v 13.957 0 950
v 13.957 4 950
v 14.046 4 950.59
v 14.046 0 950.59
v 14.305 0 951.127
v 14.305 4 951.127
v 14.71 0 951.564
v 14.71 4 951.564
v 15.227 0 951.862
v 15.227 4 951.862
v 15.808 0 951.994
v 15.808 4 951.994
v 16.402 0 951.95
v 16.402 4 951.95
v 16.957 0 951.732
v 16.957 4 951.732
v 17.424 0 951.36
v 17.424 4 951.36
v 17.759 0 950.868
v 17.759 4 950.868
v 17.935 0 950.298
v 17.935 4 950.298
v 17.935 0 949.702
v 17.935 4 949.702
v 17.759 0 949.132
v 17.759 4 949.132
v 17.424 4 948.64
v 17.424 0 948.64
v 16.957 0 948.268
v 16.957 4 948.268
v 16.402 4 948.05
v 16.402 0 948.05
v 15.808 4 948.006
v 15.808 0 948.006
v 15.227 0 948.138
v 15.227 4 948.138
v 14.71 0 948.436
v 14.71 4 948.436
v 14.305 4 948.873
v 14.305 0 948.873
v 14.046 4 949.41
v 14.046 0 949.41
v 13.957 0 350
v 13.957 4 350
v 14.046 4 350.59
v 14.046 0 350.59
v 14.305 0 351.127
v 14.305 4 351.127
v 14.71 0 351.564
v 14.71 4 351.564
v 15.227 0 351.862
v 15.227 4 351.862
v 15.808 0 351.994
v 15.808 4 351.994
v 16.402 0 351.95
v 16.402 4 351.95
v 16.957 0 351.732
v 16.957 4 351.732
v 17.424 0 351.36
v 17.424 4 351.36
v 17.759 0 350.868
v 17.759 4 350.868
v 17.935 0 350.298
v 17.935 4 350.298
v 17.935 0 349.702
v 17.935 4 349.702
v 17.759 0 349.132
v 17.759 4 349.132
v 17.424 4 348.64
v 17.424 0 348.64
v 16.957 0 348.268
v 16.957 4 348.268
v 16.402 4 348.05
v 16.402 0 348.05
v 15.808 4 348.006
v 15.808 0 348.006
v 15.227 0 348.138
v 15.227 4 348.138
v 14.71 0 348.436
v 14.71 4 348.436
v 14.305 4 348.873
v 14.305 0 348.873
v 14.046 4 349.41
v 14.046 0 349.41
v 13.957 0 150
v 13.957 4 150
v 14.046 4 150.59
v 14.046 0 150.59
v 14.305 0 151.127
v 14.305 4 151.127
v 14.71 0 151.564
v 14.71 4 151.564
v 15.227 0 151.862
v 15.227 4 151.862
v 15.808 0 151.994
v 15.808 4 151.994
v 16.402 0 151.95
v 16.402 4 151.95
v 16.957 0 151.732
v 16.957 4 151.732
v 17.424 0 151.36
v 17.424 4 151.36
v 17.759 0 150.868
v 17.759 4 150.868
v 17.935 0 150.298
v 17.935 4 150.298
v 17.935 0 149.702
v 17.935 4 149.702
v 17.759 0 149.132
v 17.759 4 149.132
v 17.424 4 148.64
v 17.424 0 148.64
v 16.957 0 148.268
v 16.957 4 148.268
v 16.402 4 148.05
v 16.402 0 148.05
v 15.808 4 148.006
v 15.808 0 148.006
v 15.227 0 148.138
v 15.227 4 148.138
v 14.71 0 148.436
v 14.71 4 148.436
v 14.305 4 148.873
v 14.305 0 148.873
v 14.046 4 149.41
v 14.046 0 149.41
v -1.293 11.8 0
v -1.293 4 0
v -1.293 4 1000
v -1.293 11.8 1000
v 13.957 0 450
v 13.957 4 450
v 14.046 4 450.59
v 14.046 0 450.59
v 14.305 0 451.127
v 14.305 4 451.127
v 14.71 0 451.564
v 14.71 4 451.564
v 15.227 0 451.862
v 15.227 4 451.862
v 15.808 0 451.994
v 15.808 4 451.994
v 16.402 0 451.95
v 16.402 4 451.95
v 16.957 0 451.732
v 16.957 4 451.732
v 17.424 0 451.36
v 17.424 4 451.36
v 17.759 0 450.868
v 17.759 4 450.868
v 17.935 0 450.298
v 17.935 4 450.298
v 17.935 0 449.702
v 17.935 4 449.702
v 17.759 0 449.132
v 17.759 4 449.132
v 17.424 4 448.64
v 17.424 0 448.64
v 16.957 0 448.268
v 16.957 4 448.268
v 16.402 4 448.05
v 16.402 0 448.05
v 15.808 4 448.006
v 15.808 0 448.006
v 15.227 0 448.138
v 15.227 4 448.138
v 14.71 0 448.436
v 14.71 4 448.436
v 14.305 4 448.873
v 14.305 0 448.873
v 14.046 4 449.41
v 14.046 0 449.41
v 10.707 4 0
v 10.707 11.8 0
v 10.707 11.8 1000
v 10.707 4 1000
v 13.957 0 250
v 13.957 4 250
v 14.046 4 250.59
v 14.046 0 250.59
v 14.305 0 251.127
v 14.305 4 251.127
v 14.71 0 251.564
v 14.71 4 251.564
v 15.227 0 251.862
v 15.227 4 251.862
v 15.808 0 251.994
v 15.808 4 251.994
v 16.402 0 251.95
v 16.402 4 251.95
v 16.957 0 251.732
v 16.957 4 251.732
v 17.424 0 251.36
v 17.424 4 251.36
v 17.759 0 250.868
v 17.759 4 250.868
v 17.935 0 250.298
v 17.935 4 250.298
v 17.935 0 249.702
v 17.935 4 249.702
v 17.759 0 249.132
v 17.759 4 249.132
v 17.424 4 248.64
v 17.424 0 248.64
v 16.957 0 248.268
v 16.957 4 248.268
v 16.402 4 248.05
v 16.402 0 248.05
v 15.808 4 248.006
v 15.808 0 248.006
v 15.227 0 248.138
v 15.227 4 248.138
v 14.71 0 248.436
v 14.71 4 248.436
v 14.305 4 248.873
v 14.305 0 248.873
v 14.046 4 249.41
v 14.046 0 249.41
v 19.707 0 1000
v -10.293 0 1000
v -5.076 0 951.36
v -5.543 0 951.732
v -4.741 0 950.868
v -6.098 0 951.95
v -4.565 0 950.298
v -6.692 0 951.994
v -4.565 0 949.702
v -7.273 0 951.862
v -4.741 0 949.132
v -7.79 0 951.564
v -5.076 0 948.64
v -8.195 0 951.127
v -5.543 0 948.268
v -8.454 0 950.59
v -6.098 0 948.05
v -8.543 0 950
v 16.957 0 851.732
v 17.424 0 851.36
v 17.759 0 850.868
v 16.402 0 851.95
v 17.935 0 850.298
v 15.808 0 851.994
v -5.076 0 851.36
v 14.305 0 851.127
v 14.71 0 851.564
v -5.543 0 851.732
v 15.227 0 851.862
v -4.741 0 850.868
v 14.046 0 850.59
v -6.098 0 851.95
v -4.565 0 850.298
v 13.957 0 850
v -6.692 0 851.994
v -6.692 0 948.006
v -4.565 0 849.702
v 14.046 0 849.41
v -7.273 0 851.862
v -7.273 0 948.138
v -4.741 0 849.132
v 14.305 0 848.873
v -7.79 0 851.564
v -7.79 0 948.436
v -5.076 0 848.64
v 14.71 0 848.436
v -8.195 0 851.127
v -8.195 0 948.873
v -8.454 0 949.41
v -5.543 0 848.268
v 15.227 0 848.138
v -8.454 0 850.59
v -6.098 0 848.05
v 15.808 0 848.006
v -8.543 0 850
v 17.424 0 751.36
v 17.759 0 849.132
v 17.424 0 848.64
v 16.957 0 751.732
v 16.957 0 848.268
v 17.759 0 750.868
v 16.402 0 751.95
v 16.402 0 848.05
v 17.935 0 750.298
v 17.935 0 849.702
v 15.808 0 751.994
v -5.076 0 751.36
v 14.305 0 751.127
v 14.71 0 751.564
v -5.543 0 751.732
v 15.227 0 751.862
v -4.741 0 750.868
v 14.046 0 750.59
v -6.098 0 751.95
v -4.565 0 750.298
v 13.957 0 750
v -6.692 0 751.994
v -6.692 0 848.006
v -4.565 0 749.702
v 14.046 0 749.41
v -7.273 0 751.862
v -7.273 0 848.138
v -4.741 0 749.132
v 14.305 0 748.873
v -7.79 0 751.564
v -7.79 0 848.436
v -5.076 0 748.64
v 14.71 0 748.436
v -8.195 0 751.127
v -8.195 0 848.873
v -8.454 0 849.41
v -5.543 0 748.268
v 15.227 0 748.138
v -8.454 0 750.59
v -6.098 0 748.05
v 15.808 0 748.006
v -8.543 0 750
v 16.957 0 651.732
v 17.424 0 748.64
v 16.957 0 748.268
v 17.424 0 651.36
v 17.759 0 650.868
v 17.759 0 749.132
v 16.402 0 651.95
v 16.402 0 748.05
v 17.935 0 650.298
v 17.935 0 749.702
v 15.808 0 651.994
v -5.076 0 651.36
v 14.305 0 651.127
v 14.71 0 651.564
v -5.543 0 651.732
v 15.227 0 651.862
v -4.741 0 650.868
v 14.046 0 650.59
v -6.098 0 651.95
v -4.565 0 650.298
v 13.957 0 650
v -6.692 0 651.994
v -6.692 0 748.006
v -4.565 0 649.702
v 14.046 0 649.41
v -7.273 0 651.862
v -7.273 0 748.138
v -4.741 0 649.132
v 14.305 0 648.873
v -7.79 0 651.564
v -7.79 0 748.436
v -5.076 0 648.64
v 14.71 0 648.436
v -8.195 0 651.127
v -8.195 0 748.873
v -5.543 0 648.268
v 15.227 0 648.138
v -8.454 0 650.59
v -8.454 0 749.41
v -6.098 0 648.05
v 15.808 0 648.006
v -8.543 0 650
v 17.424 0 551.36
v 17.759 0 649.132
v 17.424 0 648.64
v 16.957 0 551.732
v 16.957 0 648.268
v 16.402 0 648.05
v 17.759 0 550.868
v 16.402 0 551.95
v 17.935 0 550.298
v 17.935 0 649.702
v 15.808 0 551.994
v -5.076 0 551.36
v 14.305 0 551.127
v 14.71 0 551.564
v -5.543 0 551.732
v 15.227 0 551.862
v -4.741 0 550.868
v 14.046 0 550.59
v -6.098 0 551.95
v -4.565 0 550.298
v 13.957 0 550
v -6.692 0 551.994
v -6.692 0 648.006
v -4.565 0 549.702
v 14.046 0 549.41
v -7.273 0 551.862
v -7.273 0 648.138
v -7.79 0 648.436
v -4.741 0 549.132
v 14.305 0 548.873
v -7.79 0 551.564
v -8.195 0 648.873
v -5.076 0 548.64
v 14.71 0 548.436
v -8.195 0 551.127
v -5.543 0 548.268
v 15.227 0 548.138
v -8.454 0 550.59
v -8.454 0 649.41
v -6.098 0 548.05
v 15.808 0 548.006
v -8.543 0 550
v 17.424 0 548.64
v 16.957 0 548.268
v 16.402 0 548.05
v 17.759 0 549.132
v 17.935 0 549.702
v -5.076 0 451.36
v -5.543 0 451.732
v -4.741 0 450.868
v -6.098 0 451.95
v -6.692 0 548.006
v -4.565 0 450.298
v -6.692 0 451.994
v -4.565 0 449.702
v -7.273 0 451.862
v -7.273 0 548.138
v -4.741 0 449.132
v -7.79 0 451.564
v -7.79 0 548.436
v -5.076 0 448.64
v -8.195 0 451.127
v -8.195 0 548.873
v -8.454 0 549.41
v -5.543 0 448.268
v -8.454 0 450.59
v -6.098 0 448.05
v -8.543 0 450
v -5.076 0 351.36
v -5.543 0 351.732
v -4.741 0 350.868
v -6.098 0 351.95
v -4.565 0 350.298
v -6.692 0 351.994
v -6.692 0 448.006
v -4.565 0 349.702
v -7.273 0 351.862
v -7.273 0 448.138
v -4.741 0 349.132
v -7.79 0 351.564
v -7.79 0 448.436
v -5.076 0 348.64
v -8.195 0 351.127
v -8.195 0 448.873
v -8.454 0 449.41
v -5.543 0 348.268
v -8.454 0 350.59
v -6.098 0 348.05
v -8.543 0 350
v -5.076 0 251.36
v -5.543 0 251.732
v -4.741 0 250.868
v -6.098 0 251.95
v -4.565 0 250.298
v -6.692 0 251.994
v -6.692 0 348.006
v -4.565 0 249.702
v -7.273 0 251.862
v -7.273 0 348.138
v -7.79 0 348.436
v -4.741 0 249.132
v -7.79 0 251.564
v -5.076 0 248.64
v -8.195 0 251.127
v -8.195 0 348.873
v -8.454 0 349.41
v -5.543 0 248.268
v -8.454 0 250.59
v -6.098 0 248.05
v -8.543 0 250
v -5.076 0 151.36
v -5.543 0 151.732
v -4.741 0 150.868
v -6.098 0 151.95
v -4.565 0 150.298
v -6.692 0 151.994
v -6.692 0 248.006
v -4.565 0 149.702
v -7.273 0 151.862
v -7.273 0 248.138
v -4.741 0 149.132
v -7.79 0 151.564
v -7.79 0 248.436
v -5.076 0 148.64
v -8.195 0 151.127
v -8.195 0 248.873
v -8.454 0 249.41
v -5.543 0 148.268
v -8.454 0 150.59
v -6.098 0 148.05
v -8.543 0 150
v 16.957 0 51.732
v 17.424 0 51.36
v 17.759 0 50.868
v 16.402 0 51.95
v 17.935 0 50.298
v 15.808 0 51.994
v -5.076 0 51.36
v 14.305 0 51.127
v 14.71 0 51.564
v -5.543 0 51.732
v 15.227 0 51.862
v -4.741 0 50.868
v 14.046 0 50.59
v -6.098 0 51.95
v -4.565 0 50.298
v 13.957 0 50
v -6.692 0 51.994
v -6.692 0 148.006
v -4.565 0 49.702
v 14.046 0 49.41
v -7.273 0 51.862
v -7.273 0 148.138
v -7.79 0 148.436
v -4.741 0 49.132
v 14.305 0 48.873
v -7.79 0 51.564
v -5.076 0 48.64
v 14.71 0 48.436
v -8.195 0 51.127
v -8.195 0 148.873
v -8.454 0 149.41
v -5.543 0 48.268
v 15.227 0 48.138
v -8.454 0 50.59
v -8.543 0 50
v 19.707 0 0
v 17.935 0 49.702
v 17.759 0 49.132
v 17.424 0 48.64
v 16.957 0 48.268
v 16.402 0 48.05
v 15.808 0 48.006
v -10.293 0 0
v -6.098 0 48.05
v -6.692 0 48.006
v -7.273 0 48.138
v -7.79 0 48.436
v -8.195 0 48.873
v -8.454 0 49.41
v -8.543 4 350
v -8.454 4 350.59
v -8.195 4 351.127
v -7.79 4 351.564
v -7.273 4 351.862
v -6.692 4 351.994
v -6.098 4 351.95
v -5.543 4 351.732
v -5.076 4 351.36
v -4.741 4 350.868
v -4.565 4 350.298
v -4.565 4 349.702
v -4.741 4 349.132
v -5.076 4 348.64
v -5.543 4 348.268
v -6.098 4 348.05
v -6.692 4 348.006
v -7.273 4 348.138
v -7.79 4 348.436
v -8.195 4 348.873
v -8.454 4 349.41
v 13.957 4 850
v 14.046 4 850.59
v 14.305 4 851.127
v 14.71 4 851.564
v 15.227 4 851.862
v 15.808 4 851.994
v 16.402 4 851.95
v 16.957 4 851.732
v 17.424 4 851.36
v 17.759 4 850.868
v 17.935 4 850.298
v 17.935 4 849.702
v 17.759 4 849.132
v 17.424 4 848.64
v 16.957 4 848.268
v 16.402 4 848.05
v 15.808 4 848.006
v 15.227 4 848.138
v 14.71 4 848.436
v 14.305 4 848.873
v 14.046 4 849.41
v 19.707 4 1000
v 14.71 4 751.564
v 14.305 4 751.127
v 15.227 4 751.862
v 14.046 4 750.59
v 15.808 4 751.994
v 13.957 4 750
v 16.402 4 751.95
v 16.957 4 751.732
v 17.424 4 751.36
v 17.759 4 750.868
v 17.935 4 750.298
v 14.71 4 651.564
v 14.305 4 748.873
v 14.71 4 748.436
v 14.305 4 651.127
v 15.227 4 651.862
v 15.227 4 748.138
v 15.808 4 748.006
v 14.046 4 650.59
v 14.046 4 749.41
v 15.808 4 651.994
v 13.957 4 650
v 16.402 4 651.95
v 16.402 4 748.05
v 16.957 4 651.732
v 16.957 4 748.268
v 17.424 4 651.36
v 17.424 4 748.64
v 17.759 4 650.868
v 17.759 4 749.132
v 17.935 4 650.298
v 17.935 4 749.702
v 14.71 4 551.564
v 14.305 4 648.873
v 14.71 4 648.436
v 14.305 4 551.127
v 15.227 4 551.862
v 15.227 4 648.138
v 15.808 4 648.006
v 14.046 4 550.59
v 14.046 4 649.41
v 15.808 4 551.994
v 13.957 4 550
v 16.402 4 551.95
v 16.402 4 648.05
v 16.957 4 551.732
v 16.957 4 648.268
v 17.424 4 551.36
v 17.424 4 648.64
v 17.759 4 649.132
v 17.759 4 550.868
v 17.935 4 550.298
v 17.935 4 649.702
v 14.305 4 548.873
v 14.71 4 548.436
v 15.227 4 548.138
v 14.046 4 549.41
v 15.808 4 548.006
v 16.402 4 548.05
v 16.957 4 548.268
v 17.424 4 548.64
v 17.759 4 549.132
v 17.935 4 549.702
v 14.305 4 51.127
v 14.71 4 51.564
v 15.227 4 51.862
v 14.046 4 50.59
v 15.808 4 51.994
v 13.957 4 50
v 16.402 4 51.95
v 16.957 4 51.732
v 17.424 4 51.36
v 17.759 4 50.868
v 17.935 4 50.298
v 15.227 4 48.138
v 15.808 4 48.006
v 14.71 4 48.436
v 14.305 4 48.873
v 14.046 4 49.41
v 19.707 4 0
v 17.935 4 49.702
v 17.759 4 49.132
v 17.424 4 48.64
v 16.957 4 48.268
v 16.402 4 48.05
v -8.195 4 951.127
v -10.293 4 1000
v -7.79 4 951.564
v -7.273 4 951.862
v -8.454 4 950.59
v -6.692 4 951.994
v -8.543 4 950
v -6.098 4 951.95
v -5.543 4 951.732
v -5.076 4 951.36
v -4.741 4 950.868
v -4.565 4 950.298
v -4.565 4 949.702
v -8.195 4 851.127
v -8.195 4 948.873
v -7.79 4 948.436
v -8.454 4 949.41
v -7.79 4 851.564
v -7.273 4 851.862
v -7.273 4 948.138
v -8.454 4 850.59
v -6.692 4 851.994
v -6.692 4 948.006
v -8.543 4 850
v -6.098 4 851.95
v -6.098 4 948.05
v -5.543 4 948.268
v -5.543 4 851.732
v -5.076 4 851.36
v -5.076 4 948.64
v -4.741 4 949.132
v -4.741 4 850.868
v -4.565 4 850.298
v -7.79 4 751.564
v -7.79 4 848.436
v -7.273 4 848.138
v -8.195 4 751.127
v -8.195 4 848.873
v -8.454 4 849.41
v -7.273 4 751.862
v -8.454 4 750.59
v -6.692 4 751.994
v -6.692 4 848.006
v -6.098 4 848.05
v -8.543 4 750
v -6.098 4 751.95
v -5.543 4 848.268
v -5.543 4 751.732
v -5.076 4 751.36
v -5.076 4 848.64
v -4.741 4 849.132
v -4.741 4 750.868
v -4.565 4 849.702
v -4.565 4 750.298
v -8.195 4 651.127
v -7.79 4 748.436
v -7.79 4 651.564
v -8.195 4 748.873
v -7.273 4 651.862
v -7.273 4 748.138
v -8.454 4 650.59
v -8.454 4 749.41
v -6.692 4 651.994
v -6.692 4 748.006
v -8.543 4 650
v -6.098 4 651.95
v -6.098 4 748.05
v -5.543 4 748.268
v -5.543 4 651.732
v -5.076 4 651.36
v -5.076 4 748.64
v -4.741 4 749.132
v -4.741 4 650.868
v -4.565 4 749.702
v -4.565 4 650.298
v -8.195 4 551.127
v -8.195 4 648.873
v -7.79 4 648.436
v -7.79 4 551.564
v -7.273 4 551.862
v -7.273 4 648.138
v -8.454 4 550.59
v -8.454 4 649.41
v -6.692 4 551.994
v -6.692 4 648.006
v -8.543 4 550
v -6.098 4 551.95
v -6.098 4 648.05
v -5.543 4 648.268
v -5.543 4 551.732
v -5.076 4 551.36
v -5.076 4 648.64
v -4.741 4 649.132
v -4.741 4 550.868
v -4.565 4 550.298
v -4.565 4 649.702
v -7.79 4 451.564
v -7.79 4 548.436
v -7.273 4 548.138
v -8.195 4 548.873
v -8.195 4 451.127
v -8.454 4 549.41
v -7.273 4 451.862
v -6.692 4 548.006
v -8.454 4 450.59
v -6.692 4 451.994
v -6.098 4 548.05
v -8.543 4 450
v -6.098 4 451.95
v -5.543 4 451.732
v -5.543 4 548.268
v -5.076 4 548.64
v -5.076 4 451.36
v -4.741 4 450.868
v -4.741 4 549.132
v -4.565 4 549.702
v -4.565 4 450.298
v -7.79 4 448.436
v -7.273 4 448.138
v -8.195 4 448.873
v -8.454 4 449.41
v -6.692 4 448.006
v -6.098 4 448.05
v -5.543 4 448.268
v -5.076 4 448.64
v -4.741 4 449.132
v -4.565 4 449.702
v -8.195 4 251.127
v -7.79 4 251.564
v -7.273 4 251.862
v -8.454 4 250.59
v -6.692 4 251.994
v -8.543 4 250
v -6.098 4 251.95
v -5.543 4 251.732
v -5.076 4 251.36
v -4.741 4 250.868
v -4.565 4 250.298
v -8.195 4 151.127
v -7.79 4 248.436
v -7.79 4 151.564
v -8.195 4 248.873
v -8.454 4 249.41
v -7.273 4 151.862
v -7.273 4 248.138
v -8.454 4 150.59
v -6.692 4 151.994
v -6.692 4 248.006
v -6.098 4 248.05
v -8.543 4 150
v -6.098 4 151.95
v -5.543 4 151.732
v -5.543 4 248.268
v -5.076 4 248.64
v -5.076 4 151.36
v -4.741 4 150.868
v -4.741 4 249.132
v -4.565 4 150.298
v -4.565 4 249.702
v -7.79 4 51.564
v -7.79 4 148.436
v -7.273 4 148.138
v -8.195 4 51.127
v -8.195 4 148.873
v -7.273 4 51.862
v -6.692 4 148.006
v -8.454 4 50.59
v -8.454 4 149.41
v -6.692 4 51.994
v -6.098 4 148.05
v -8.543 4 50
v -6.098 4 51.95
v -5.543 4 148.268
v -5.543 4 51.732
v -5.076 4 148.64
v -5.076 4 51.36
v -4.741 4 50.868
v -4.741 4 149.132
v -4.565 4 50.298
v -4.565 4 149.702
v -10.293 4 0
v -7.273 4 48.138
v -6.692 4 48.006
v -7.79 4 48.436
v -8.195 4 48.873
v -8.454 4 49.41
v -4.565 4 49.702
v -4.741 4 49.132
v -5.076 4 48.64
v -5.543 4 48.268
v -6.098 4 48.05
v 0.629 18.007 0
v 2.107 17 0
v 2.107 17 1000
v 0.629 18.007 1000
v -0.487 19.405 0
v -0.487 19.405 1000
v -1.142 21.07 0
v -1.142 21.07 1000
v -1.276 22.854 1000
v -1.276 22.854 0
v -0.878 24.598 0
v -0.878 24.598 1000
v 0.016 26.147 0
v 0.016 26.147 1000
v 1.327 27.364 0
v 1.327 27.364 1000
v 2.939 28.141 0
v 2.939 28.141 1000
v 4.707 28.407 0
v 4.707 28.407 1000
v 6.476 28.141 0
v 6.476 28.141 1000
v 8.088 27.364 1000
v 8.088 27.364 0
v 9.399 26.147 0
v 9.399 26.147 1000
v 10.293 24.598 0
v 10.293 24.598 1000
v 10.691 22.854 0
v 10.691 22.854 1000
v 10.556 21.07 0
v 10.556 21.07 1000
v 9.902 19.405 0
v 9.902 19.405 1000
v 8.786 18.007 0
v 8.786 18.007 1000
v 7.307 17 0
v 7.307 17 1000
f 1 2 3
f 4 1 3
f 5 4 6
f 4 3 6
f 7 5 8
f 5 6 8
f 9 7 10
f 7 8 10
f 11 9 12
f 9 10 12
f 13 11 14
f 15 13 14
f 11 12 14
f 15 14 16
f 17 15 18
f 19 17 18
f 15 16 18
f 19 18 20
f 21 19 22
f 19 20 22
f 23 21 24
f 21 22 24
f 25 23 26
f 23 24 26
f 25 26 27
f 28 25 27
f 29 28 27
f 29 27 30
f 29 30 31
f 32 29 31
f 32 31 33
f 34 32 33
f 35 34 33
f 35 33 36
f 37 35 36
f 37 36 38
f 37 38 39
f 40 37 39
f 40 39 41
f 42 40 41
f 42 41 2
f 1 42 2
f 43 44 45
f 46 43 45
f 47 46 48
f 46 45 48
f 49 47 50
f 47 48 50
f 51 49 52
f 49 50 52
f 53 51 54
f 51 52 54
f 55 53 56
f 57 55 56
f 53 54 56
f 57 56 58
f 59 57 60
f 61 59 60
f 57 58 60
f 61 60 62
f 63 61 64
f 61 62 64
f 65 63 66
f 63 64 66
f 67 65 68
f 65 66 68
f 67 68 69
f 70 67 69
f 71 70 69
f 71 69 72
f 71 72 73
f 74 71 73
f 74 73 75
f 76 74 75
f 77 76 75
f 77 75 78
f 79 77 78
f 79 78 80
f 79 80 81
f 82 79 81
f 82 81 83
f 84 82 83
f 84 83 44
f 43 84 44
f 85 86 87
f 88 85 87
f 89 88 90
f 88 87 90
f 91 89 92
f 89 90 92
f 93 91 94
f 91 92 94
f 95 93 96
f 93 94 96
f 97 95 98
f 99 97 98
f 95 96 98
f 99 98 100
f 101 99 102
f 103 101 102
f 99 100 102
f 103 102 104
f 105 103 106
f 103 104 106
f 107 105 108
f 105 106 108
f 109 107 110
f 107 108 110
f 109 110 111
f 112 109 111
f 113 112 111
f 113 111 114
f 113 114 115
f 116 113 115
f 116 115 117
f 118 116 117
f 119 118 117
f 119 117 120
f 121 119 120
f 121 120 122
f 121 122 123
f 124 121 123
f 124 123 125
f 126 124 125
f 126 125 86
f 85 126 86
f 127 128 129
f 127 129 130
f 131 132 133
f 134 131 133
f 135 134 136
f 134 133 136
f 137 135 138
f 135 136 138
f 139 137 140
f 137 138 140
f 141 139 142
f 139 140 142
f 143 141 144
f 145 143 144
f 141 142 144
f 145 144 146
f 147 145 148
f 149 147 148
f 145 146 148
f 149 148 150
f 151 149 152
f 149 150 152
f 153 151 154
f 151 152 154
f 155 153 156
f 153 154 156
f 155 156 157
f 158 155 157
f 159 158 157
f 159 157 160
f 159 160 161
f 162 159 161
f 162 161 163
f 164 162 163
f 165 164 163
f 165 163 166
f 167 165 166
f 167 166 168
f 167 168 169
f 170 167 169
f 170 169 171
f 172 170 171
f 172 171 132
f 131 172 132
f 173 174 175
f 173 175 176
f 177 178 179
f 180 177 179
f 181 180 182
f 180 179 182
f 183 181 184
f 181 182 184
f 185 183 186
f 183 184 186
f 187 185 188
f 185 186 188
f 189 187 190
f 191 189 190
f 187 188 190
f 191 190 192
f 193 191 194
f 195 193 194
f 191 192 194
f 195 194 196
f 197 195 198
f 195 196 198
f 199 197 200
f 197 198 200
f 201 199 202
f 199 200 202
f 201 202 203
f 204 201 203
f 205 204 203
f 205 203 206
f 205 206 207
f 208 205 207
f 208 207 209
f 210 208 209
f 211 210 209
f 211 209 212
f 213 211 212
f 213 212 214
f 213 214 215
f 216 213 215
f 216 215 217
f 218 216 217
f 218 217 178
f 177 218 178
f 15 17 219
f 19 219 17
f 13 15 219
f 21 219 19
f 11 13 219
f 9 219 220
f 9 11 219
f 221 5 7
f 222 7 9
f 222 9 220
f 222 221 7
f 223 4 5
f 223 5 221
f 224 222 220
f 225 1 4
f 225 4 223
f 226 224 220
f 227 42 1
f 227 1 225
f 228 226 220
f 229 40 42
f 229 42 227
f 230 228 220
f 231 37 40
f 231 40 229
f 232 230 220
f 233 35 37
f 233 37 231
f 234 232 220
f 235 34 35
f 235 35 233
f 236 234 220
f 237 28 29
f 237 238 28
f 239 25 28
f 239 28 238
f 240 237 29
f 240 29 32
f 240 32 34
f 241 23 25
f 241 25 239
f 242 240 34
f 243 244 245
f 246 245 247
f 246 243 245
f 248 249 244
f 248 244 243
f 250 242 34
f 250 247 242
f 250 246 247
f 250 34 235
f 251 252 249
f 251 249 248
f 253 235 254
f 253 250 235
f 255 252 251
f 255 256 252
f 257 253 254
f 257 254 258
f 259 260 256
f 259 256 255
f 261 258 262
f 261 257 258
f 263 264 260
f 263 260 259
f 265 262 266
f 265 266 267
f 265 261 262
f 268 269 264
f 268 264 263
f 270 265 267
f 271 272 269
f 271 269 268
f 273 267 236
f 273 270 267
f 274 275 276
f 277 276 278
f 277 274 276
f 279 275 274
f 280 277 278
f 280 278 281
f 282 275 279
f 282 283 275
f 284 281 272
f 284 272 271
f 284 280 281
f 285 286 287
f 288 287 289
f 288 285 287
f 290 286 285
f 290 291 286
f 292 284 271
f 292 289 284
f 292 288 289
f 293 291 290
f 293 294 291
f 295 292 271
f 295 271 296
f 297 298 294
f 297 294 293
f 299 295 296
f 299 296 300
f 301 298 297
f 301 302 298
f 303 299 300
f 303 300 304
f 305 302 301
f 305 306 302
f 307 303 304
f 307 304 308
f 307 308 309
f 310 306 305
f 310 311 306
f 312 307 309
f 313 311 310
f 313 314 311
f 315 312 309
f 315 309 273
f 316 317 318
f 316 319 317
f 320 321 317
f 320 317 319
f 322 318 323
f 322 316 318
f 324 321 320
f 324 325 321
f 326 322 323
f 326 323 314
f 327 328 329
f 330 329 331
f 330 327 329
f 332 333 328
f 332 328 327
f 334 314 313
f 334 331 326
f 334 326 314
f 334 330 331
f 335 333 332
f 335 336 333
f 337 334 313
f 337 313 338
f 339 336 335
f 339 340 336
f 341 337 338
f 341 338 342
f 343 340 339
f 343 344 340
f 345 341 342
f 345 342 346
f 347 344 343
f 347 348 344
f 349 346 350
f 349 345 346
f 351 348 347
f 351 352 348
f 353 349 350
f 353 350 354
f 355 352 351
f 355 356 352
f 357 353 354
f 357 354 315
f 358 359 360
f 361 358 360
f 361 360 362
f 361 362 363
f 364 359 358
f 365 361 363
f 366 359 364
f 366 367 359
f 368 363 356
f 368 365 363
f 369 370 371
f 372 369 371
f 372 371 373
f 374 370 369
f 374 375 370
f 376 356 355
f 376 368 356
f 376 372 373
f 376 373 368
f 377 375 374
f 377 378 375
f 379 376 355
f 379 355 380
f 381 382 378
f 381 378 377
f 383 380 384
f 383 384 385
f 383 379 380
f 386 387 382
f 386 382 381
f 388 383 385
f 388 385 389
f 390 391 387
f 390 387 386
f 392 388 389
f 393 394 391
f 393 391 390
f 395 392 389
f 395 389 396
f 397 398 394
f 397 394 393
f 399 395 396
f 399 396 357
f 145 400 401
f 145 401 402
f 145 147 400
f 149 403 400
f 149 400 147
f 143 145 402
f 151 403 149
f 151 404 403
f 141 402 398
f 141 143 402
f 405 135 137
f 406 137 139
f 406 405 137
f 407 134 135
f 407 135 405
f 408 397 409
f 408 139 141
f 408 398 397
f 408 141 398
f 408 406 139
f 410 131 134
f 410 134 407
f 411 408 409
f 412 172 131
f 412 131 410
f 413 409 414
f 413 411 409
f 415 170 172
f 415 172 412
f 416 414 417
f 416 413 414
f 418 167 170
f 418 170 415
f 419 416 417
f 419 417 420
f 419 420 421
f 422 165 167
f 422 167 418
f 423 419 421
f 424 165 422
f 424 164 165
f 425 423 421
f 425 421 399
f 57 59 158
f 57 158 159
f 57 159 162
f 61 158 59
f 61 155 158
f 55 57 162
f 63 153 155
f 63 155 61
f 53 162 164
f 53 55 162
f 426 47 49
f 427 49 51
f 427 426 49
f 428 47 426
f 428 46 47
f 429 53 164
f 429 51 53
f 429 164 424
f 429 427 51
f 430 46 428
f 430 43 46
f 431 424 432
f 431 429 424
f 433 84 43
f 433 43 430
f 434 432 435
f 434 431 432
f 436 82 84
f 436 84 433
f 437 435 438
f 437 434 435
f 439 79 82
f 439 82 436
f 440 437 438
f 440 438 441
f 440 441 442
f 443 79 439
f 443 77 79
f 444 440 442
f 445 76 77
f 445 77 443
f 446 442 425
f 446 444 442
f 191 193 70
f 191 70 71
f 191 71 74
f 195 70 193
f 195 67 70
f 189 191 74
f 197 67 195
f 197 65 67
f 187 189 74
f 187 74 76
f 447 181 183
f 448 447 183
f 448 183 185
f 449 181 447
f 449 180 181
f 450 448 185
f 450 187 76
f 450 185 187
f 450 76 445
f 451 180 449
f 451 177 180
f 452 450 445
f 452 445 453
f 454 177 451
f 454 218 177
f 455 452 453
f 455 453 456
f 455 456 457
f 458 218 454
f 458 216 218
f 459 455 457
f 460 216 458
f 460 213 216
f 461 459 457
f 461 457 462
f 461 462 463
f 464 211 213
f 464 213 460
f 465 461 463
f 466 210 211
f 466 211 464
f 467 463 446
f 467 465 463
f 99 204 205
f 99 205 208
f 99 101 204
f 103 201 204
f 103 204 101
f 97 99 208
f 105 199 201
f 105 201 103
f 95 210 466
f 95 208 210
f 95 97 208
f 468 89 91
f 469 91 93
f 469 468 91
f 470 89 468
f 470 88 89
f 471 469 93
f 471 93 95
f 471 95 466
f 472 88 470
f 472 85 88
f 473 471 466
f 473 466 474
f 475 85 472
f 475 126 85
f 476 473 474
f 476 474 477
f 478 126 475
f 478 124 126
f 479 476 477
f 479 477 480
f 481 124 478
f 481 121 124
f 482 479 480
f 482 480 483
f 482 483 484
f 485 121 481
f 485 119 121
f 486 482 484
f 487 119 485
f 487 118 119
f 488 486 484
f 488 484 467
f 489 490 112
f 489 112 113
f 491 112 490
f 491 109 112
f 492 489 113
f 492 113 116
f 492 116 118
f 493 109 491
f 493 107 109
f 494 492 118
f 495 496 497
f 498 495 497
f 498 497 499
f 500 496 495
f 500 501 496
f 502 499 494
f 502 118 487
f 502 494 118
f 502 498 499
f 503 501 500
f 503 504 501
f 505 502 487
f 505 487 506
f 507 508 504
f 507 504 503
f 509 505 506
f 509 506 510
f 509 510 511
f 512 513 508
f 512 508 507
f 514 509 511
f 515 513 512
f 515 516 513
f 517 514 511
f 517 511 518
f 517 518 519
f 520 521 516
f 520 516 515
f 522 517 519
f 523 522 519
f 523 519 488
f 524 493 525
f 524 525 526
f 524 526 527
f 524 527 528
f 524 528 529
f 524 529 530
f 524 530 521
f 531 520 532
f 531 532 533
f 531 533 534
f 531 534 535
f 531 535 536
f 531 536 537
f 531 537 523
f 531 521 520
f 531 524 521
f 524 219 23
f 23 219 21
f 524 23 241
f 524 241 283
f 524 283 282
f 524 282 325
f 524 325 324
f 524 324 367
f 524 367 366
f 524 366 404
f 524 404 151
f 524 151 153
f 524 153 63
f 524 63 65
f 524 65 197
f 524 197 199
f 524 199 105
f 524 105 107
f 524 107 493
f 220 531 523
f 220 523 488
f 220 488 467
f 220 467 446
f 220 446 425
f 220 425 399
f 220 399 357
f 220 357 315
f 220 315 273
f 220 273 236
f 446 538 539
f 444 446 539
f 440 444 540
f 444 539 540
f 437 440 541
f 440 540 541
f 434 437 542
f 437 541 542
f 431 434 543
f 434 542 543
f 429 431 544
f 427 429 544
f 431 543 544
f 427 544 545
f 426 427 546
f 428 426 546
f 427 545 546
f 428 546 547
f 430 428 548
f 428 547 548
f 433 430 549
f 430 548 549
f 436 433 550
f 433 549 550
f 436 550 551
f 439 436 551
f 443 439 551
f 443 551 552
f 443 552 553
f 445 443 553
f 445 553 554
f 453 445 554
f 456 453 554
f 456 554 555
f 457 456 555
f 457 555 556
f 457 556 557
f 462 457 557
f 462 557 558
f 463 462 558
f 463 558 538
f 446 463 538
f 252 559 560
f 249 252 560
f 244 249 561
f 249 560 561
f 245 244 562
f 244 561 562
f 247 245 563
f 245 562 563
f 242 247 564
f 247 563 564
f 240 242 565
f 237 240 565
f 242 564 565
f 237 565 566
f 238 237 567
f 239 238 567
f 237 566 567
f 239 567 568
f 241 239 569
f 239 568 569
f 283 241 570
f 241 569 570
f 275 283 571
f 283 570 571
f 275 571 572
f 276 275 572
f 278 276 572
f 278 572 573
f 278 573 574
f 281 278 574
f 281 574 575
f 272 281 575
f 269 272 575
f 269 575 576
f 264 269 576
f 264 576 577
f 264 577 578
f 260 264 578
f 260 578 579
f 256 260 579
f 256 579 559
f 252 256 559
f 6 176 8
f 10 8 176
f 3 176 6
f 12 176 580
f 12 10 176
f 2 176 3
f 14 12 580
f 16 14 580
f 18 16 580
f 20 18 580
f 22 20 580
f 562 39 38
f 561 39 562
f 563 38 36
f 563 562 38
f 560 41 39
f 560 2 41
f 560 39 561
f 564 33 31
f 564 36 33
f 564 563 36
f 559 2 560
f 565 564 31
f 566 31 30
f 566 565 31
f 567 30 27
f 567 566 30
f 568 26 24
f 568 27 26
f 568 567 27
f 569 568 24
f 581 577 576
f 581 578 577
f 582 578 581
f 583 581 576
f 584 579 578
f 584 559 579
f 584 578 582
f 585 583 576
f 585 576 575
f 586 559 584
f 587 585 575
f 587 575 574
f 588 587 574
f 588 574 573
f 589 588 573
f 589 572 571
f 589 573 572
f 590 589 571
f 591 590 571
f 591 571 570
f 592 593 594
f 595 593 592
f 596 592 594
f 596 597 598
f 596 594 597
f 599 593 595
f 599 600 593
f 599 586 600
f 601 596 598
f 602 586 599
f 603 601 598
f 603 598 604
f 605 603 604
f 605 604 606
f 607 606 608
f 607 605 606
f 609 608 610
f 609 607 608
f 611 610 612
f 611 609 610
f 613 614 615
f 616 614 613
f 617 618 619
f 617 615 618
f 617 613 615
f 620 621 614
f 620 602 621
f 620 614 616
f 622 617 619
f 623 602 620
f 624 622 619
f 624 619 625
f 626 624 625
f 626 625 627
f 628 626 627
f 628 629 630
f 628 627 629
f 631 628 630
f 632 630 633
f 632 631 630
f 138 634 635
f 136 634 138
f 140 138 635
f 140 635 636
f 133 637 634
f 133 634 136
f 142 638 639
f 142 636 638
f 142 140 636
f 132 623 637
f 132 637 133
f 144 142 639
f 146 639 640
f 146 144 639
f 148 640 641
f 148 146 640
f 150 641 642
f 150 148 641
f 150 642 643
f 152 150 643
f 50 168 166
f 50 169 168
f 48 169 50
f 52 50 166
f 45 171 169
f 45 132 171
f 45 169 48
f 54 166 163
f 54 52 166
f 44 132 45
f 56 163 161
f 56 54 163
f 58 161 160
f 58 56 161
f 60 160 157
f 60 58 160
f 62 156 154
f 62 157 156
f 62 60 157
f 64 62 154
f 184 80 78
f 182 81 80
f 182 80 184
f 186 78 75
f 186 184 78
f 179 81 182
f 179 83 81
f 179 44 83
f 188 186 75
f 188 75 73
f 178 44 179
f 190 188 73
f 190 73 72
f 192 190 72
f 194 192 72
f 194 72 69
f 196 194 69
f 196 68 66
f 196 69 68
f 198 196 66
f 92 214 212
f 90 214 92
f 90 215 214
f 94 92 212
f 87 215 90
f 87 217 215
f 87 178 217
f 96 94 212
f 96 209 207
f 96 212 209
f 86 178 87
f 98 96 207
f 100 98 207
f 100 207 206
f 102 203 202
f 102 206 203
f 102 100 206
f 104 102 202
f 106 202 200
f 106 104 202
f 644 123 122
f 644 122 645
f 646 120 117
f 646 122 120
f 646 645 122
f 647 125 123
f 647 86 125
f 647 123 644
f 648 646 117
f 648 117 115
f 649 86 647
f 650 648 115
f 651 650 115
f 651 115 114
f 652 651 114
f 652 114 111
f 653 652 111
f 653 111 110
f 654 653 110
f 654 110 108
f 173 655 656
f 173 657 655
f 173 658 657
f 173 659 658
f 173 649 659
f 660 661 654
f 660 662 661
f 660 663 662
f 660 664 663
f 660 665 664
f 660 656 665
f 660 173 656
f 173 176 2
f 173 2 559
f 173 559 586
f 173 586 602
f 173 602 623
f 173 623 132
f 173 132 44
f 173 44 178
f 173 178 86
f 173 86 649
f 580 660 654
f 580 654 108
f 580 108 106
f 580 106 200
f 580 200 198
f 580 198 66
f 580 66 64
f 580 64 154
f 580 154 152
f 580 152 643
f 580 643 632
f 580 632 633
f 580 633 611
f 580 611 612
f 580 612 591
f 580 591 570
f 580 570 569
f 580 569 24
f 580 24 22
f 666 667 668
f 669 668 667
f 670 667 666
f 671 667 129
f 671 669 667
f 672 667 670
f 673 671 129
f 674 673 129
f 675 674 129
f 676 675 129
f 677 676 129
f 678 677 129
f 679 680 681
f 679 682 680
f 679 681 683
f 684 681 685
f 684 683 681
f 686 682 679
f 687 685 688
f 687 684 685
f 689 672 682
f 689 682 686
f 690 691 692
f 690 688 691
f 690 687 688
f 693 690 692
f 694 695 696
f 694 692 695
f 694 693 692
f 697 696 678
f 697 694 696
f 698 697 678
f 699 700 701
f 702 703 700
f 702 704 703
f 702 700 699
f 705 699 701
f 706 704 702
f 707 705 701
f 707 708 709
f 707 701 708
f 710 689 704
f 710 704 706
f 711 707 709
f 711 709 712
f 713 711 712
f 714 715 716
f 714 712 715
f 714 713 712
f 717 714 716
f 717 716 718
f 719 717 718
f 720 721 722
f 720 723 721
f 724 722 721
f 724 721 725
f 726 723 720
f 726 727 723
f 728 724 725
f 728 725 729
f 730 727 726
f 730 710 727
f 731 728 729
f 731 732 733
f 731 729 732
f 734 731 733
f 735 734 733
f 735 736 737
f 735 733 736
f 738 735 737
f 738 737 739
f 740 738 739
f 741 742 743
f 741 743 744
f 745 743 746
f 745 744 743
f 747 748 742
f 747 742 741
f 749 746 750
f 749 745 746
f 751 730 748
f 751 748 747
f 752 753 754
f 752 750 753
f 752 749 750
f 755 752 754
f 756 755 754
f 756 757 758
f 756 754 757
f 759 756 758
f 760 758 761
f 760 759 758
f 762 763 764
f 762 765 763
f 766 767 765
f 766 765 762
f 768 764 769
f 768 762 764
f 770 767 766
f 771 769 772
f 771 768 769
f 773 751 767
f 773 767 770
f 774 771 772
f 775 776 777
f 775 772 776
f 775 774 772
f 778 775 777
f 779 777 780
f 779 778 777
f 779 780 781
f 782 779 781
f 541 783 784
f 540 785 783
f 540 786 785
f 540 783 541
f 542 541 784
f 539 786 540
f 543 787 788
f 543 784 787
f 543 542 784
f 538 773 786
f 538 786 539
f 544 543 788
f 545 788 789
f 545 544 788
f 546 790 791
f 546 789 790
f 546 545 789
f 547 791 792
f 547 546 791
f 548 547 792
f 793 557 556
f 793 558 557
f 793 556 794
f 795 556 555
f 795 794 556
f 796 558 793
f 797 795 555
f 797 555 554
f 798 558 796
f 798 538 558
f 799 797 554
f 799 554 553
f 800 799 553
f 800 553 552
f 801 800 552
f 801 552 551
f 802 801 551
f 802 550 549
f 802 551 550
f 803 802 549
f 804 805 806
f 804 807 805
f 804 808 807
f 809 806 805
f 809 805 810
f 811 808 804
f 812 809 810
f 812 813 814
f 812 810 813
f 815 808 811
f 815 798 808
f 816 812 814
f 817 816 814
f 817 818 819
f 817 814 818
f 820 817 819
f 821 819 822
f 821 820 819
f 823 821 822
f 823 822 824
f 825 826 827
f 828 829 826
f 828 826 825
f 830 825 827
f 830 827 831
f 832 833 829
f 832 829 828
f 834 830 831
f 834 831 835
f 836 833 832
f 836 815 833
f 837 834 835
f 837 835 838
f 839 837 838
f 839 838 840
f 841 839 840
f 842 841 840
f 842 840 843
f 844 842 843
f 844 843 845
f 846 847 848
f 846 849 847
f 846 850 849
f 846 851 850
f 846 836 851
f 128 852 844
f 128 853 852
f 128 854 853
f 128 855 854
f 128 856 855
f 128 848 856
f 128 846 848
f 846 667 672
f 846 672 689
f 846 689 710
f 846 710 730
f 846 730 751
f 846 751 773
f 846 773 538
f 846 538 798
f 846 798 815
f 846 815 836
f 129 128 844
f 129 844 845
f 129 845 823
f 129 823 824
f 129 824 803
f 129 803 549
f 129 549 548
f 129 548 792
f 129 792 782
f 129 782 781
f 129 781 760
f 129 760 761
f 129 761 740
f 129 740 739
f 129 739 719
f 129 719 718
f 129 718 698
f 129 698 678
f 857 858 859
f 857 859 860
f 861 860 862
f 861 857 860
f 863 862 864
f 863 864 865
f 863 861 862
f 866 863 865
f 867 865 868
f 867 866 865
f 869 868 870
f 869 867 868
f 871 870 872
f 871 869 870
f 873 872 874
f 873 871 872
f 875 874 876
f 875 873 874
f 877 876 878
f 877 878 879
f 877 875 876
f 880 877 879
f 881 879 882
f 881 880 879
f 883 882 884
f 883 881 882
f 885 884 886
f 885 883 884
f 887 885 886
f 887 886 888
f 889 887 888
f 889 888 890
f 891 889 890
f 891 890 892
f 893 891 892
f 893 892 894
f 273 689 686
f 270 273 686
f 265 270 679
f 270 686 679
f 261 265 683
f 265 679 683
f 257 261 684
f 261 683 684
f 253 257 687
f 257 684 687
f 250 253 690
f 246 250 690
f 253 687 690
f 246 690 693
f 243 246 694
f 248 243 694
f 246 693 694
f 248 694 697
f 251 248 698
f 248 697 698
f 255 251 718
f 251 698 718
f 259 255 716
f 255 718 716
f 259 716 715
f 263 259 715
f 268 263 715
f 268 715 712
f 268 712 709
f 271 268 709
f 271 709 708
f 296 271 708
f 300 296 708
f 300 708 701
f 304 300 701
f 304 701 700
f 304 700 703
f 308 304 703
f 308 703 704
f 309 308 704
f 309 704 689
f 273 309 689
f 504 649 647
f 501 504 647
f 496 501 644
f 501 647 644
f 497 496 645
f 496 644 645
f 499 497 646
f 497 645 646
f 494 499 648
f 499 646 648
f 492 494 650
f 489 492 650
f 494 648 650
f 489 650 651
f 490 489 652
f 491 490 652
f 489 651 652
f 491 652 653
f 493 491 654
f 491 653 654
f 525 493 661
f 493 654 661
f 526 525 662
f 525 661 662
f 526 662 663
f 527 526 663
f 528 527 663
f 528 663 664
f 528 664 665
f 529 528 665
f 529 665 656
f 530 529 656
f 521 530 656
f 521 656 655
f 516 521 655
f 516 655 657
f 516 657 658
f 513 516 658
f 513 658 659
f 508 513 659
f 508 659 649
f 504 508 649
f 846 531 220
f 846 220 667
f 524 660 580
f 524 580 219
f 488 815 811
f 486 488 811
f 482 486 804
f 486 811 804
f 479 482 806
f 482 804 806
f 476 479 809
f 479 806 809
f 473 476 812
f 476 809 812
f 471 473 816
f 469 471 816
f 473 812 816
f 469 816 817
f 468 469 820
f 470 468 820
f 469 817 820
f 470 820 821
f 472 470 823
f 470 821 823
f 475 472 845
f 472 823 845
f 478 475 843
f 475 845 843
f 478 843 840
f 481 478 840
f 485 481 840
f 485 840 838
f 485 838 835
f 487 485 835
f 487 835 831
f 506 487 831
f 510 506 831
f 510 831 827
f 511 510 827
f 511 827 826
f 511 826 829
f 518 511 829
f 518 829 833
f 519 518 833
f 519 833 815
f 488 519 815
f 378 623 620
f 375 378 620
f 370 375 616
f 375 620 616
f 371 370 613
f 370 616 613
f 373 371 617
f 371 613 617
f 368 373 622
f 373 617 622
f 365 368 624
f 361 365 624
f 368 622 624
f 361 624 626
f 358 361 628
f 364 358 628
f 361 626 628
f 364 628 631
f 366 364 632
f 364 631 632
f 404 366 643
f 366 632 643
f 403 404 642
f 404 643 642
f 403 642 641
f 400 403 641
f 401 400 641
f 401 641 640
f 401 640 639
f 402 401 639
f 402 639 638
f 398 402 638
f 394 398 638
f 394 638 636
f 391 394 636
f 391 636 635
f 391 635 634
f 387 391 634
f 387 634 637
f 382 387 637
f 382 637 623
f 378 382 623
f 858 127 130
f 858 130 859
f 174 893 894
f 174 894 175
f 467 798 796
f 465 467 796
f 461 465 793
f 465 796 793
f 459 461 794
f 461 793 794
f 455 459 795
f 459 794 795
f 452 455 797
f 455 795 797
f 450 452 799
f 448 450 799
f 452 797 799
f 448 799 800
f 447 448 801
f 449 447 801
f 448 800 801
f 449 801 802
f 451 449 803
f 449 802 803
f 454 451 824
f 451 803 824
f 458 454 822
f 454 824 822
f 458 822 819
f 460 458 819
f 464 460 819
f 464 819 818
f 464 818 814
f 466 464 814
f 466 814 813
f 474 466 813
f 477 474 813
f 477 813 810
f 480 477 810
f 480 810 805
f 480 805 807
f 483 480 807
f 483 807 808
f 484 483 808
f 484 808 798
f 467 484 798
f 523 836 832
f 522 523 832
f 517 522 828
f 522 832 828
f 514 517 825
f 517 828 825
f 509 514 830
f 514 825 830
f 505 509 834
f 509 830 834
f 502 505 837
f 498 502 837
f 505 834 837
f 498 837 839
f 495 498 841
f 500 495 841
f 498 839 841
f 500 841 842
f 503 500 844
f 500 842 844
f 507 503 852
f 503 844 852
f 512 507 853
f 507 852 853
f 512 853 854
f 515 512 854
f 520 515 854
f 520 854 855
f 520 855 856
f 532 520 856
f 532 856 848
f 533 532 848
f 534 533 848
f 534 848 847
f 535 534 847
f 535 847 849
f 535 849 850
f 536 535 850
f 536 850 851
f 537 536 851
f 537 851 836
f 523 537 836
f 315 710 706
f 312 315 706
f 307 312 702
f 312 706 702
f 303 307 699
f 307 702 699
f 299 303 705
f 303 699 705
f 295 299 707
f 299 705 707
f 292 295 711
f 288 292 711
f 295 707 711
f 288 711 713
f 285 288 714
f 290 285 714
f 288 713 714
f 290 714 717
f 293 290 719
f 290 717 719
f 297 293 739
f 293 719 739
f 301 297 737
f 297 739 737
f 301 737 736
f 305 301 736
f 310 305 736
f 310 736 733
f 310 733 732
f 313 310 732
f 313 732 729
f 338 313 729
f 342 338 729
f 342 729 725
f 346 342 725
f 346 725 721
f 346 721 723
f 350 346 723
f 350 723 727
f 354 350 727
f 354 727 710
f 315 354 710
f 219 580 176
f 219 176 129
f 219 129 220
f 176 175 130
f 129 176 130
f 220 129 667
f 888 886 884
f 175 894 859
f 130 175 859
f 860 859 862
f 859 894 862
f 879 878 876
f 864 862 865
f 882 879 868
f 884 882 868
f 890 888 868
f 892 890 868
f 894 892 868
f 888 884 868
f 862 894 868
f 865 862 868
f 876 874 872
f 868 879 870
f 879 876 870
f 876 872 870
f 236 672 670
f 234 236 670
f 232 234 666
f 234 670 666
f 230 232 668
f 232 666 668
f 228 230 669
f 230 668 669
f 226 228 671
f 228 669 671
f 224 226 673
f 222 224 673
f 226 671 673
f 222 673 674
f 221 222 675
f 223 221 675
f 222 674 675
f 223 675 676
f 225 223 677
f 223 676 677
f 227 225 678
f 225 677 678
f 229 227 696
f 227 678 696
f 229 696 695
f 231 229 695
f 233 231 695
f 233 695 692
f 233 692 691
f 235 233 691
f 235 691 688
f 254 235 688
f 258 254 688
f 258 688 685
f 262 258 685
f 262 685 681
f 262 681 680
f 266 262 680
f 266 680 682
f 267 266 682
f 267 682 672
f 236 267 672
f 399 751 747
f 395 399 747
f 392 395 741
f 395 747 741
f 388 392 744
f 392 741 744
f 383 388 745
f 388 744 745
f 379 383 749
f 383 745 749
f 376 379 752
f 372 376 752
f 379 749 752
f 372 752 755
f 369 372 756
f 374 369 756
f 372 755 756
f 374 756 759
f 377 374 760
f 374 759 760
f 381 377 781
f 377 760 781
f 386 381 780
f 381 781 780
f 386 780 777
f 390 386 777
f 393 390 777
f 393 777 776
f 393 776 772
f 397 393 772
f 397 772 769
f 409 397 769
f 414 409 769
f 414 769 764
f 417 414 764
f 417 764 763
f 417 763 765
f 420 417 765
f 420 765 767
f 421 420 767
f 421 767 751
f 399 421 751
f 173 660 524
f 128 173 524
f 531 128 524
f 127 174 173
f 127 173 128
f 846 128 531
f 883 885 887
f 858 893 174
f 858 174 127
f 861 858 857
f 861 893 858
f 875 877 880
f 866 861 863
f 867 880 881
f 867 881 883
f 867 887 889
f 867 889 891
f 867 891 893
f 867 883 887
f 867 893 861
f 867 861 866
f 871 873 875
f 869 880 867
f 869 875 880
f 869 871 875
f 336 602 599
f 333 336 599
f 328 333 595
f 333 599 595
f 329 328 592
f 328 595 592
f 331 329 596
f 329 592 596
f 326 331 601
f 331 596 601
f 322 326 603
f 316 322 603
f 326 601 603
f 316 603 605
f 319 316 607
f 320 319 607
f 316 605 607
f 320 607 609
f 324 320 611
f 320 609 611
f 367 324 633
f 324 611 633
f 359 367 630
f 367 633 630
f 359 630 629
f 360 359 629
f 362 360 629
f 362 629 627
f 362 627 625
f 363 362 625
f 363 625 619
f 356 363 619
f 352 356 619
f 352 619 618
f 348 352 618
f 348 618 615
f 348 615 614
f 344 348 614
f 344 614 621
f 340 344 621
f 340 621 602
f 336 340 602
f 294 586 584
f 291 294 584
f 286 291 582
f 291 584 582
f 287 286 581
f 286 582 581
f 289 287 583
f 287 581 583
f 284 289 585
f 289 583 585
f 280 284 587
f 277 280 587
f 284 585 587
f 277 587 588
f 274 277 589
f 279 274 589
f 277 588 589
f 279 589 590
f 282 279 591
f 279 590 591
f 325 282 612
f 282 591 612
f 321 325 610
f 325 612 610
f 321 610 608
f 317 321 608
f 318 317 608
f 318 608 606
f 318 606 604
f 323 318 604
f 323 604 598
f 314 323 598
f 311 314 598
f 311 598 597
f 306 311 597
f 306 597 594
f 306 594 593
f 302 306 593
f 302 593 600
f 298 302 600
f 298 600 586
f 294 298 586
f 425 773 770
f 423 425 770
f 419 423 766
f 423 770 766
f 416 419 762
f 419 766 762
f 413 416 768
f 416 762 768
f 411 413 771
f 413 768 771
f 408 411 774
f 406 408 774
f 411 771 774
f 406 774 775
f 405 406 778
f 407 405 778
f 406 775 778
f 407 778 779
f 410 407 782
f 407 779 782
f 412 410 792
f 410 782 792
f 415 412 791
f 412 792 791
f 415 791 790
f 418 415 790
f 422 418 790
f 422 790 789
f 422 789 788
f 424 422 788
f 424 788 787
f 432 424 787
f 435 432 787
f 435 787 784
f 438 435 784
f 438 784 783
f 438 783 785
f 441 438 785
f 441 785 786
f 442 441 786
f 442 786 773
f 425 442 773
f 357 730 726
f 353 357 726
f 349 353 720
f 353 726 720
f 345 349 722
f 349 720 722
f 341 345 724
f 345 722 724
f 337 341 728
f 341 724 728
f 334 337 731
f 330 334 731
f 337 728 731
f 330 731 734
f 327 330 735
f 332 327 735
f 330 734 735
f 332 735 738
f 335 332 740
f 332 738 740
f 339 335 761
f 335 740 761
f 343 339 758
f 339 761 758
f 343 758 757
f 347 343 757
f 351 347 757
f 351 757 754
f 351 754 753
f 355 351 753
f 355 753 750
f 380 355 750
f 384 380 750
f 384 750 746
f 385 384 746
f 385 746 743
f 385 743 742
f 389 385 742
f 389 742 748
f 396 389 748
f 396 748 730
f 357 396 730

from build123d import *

# Parameters (mm, degrees)
BOSS_EXTRUDE1_DEPTH = 1000
CUT_EXTRUDE1_REACH  = 1002.492
SKETCH2_R           = 2


with BuildPart() as part:
    # Sketch1 → Boss-Extrude1 (new body)
    with BuildSketch(Plane.XY):
        with BuildLine():
            Line((19.707457755, 0), (-10.292542245, 0))
            Line((-10.292542245, 0), (-10.292542245, 4))
            Line((-10.292542245, 4), (-1.292542245, 4))
            Line((-1.292542245, 4), (-1.292542245, 11.8))
            Line((-1.292542245, 11.8), (2.107457755, 17))
            ThreePointArc((2.107457755, 17), (4.707457755, 28.407402334), (7.307457755, 17))
            Line((7.307457755, 17), (10.707457755, 11.8))
            Line((10.707457755, 11.8), (10.707457755, 4))
            Line((10.707457755, 4), (19.707457755, 4))
            Line((19.707457755, 4), (19.707457755, 0))
        make_face()
    extrude(amount=BOSS_EXTRUDE1_DEPTH)

    # Sketch2 → Cut-Extrude1 (cut, up to next)
    with BuildSketch(Plane(origin=(0, 4, 0), x_dir=(1, 0, 0), z_dir=(0, 1, 0)), mode=Mode.PRIVATE) as cut_extrude1_sk1:
        with Locations(Location((-6.542542245, -50, 0), (0, 0, 180))):
            Circle(SKETCH2_R)
    cut_extrude1_tool1 = extrude(cut_extrude1_sk1.sketch, amount=-CUT_EXTRUDE1_REACH, mode=Mode.PRIVATE) & part.part
    # Sketch2 → Cut-Extrude1 (cut, up to next)
    with BuildSketch(Plane(origin=(0, 4, 0), x_dir=(1, 0, 0), z_dir=(0, 1, 0)), mode=Mode.PRIVATE) as cut_extrude1_sk2:
        with Locations(Location((-6.542542245, -150, 0), (0, 0, 180))):
            Circle(SKETCH2_R)
    cut_extrude1_tool2 = extrude(cut_extrude1_sk2.sketch, amount=-CUT_EXTRUDE1_REACH, mode=Mode.PRIVATE) & part.part
    # Sketch2 → Cut-Extrude1 (cut, up to next)
    with BuildSketch(Plane(origin=(0, 4, 0), x_dir=(1, 0, 0), z_dir=(0, 1, 0)), mode=Mode.PRIVATE) as cut_extrude1_sk3:
        with Locations(Location((-6.542542245, -250, 0), (0, 0, 180))):
            Circle(SKETCH2_R)
    cut_extrude1_tool3 = extrude(cut_extrude1_sk3.sketch, amount=-CUT_EXTRUDE1_REACH, mode=Mode.PRIVATE) & part.part
    # Sketch2 → Cut-Extrude1 (cut, up to next)
    with BuildSketch(Plane(origin=(0, 4, 0), x_dir=(1, 0, 0), z_dir=(0, 1, 0)), mode=Mode.PRIVATE) as cut_extrude1_sk4:
        with Locations(Location((-6.542542245, -350, 0), (0, 0, 180))):
            Circle(SKETCH2_R)
    cut_extrude1_tool4 = extrude(cut_extrude1_sk4.sketch, amount=-CUT_EXTRUDE1_REACH, mode=Mode.PRIVATE) & part.part
    # Sketch2 → Cut-Extrude1 (cut, up to next)
    with BuildSketch(Plane(origin=(0, 4, 0), x_dir=(1, 0, 0), z_dir=(0, 1, 0)), mode=Mode.PRIVATE) as cut_extrude1_sk5:
        with Locations(Location((-6.542542245, -450, 0), (0, 0, 180))):
            Circle(SKETCH2_R)
    cut_extrude1_tool5 = extrude(cut_extrude1_sk5.sketch, amount=-CUT_EXTRUDE1_REACH, mode=Mode.PRIVATE) & part.part
    # Sketch2 → Cut-Extrude1 (cut, up to next)
    with BuildSketch(Plane(origin=(0, 4, 0), x_dir=(1, 0, 0), z_dir=(0, 1, 0)), mode=Mode.PRIVATE) as cut_extrude1_sk6:
        with Locations(Location((-6.542542245, -550, 0), (0, 0, 180))):
            Circle(SKETCH2_R)
    cut_extrude1_tool6 = extrude(cut_extrude1_sk6.sketch, amount=-CUT_EXTRUDE1_REACH, mode=Mode.PRIVATE) & part.part
    # Sketch2 → Cut-Extrude1 (cut, up to next)
    with BuildSketch(Plane(origin=(0, 4, 0), x_dir=(1, 0, 0), z_dir=(0, 1, 0)), mode=Mode.PRIVATE) as cut_extrude1_sk7:
        with Locations(Location((-6.542542245, -650, 0), (0, 0, 180))):
            Circle(SKETCH2_R)
    cut_extrude1_tool7 = extrude(cut_extrude1_sk7.sketch, amount=-CUT_EXTRUDE1_REACH, mode=Mode.PRIVATE) & part.part
    # Sketch2 → Cut-Extrude1 (cut, up to next)
    with BuildSketch(Plane(origin=(0, 4, 0), x_dir=(1, 0, 0), z_dir=(0, 1, 0)), mode=Mode.PRIVATE) as cut_extrude1_sk8:
        with Locations(Location((-6.542542245, -750, 0), (0, 0, 180))):
            Circle(SKETCH2_R)
    cut_extrude1_tool8 = extrude(cut_extrude1_sk8.sketch, amount=-CUT_EXTRUDE1_REACH, mode=Mode.PRIVATE) & part.part
    # Sketch2 → Cut-Extrude1 (cut, up to next)
    with BuildSketch(Plane(origin=(0, 4, 0), x_dir=(1, 0, 0), z_dir=(0, 1, 0)), mode=Mode.PRIVATE) as cut_extrude1_sk9:
        with Locations(Location((-6.542542245, -850, 0), (0, 0, 180))):
            Circle(SKETCH2_R)
    cut_extrude1_tool9 = extrude(cut_extrude1_sk9.sketch, amount=-CUT_EXTRUDE1_REACH, mode=Mode.PRIVATE) & part.part
    # Sketch2 → Cut-Extrude1 (cut, up to next)
    with BuildSketch(Plane(origin=(0, 4, 0), x_dir=(1, 0, 0), z_dir=(0, 1, 0)), mode=Mode.PRIVATE) as cut_extrude1_sk10:
        with Locations(Location((-6.542542245, -950, 0), (0, 0, 180))):
            Circle(SKETCH2_R)
    cut_extrude1_tool10 = extrude(cut_extrude1_sk10.sketch, amount=-CUT_EXTRUDE1_REACH, mode=Mode.PRIVATE) & part.part
    # Sketch2 → Cut-Extrude1 (cut, up to next)
    with BuildSketch(Plane(origin=(0, 4, 0), x_dir=(1, 0, 0), z_dir=(0, 1, 0)), mode=Mode.PRIVATE) as cut_extrude1_sk11:
        with Locations(Location((15.957457755, -50, 0), (0, 0, 180))):
            Circle(SKETCH2_R)
    cut_extrude1_tool11 = extrude(cut_extrude1_sk11.sketch, amount=-CUT_EXTRUDE1_REACH, mode=Mode.PRIVATE) & part.part
    # Sketch2 → Cut-Extrude1 (cut, up to next)
    with BuildSketch(Plane(origin=(0, 4, 0), x_dir=(1, 0, 0), z_dir=(0, 1, 0)), mode=Mode.PRIVATE) as cut_extrude1_sk12:
        with Locations(Location((15.957457755, -150, 0), (0, 0, 180))):
            Circle(SKETCH2_R)
    cut_extrude1_tool12 = extrude(cut_extrude1_sk12.sketch, amount=-CUT_EXTRUDE1_REACH, mode=Mode.PRIVATE) & part.part
    # Sketch2 → Cut-Extrude1 (cut, up to next)
    with BuildSketch(Plane(origin=(0, 4, 0), x_dir=(1, 0, 0), z_dir=(0, 1, 0)), mode=Mode.PRIVATE) as cut_extrude1_sk13:
        with Locations(Location((15.957457755, -250, 0), (0, 0, 180))):
            Circle(SKETCH2_R)
    cut_extrude1_tool13 = extrude(cut_extrude1_sk13.sketch, amount=-CUT_EXTRUDE1_REACH, mode=Mode.PRIVATE) & part.part
    # Sketch2 → Cut-Extrude1 (cut, up to next)
    with BuildSketch(Plane(origin=(0, 4, 0), x_dir=(1, 0, 0), z_dir=(0, 1, 0)), mode=Mode.PRIVATE) as cut_extrude1_sk14:
        with Locations(Location((15.957457755, -350, 0), (0, 0, 180))):
            Circle(SKETCH2_R)
    cut_extrude1_tool14 = extrude(cut_extrude1_sk14.sketch, amount=-CUT_EXTRUDE1_REACH, mode=Mode.PRIVATE) & part.part
    # Sketch2 → Cut-Extrude1 (cut, up to next)
    with BuildSketch(Plane(origin=(0, 4, 0), x_dir=(1, 0, 0), z_dir=(0, 1, 0)), mode=Mode.PRIVATE) as cut_extrude1_sk15:
        with Locations(Location((15.957457755, -450, 0), (0, 0, 180))):
            Circle(SKETCH2_R)
    cut_extrude1_tool15 = extrude(cut_extrude1_sk15.sketch, amount=-CUT_EXTRUDE1_REACH, mode=Mode.PRIVATE) & part.part
    # Sketch2 → Cut-Extrude1 (cut, up to next)
    with BuildSketch(Plane(origin=(0, 4, 0), x_dir=(1, 0, 0), z_dir=(0, 1, 0)), mode=Mode.PRIVATE) as cut_extrude1_sk16:
        with Locations(Location((15.957457755, -550, 0), (0, 0, 180))):
            Circle(SKETCH2_R)
    cut_extrude1_tool16 = extrude(cut_extrude1_sk16.sketch, amount=-CUT_EXTRUDE1_REACH, mode=Mode.PRIVATE) & part.part
    # Sketch2 → Cut-Extrude1 (cut, up to next)
    with BuildSketch(Plane(origin=(0, 4, 0), x_dir=(1, 0, 0), z_dir=(0, 1, 0)), mode=Mode.PRIVATE) as cut_extrude1_sk17:
        with Locations(Location((15.957457755, -650, 0), (0, 0, 180))):
            Circle(SKETCH2_R)
    cut_extrude1_tool17 = extrude(cut_extrude1_sk17.sketch, amount=-CUT_EXTRUDE1_REACH, mode=Mode.PRIVATE) & part.part
    # Sketch2 → Cut-Extrude1 (cut, up to next)
    with BuildSketch(Plane(origin=(0, 4, 0), x_dir=(1, 0, 0), z_dir=(0, 1, 0)), mode=Mode.PRIVATE) as cut_extrude1_sk18:
        with Locations(Location((15.957457755, -750, 0), (0, 0, 180))):
            Circle(SKETCH2_R)
    cut_extrude1_tool18 = extrude(cut_extrude1_sk18.sketch, amount=-CUT_EXTRUDE1_REACH, mode=Mode.PRIVATE) & part.part
    # Sketch2 → Cut-Extrude1 (cut, up to next)
    with BuildSketch(Plane(origin=(0, 4, 0), x_dir=(1, 0, 0), z_dir=(0, 1, 0)), mode=Mode.PRIVATE) as cut_extrude1_sk19:
        with Locations(Location((15.957457755, -850, 0), (0, 0, 180))):
            Circle(SKETCH2_R)
    cut_extrude1_tool19 = extrude(cut_extrude1_sk19.sketch, amount=-CUT_EXTRUDE1_REACH, mode=Mode.PRIVATE) & part.part
    # Sketch2 → Cut-Extrude1 (cut, up to next)
    with BuildSketch(Plane(origin=(0, 4, 0), x_dir=(1, 0, 0), z_dir=(0, 1, 0)), mode=Mode.PRIVATE) as cut_extrude1_sk20:
        with Locations(Location((15.957457755, -950, 0), (0, 0, 180))):
            Circle(SKETCH2_R)
    cut_extrude1_tool20 = extrude(cut_extrude1_sk20.sketch, amount=-CUT_EXTRUDE1_REACH, mode=Mode.PRIVATE) & part.part
    add(cut_extrude1_tool1.solids().sort_by_distance((-6.542542, 4, 50))[0], mode=Mode.SUBTRACT)
    add(cut_extrude1_tool2.solids().sort_by_distance((-6.542542, 4, 150))[0], mode=Mode.SUBTRACT)
    add(cut_extrude1_tool3.solids().sort_by_distance((-6.542542, 4, 250))[0], mode=Mode.SUBTRACT)
    add(cut_extrude1_tool4.solids().sort_by_distance((-6.542542, 4, 350))[0], mode=Mode.SUBTRACT)
    add(cut_extrude1_tool5.solids().sort_by_distance((-6.542542, 4, 450))[0], mode=Mode.SUBTRACT)
    add(cut_extrude1_tool6.solids().sort_by_distance((-6.542542, 4, 550))[0], mode=Mode.SUBTRACT)
    add(cut_extrude1_tool7.solids().sort_by_distance((-6.542542, 4, 650))[0], mode=Mode.SUBTRACT)
    add(cut_extrude1_tool8.solids().sort_by_distance((-6.542542, 4, 750))[0], mode=Mode.SUBTRACT)
    add(cut_extrude1_tool9.solids().sort_by_distance((-6.542542, 4, 850))[0], mode=Mode.SUBTRACT)
    add(cut_extrude1_tool10.solids().sort_by_distance((-6.542542, 4, 950))[0], mode=Mode.SUBTRACT)
    add(cut_extrude1_tool11.solids().sort_by_distance((15.957458, 4, 50))[0], mode=Mode.SUBTRACT)
    add(cut_extrude1_tool12.solids().sort_by_distance((15.957458, 4, 150))[0], mode=Mode.SUBTRACT)
    add(cut_extrude1_tool13.solids().sort_by_distance((15.957458, 4, 250))[0], mode=Mode.SUBTRACT)
    add(cut_extrude1_tool14.solids().sort_by_distance((15.957458, 4, 350))[0], mode=Mode.SUBTRACT)
    add(cut_extrude1_tool15.solids().sort_by_distance((15.957458, 4, 450))[0], mode=Mode.SUBTRACT)
    add(cut_extrude1_tool16.solids().sort_by_distance((15.957458, 4, 550))[0], mode=Mode.SUBTRACT)
    add(cut_extrude1_tool17.solids().sort_by_distance((15.957458, 4, 650))[0], mode=Mode.SUBTRACT)
    add(cut_extrude1_tool18.solids().sort_by_distance((15.957458, 4, 750))[0], mode=Mode.SUBTRACT)
    add(cut_extrude1_tool19.solids().sort_by_distance((15.957458, 4, 850))[0], mode=Mode.SUBTRACT)
    add(cut_extrude1_tool20.solids().sort_by_distance((15.957458, 4, 950))[0], mode=Mode.SUBTRACT)


solid = part.part
